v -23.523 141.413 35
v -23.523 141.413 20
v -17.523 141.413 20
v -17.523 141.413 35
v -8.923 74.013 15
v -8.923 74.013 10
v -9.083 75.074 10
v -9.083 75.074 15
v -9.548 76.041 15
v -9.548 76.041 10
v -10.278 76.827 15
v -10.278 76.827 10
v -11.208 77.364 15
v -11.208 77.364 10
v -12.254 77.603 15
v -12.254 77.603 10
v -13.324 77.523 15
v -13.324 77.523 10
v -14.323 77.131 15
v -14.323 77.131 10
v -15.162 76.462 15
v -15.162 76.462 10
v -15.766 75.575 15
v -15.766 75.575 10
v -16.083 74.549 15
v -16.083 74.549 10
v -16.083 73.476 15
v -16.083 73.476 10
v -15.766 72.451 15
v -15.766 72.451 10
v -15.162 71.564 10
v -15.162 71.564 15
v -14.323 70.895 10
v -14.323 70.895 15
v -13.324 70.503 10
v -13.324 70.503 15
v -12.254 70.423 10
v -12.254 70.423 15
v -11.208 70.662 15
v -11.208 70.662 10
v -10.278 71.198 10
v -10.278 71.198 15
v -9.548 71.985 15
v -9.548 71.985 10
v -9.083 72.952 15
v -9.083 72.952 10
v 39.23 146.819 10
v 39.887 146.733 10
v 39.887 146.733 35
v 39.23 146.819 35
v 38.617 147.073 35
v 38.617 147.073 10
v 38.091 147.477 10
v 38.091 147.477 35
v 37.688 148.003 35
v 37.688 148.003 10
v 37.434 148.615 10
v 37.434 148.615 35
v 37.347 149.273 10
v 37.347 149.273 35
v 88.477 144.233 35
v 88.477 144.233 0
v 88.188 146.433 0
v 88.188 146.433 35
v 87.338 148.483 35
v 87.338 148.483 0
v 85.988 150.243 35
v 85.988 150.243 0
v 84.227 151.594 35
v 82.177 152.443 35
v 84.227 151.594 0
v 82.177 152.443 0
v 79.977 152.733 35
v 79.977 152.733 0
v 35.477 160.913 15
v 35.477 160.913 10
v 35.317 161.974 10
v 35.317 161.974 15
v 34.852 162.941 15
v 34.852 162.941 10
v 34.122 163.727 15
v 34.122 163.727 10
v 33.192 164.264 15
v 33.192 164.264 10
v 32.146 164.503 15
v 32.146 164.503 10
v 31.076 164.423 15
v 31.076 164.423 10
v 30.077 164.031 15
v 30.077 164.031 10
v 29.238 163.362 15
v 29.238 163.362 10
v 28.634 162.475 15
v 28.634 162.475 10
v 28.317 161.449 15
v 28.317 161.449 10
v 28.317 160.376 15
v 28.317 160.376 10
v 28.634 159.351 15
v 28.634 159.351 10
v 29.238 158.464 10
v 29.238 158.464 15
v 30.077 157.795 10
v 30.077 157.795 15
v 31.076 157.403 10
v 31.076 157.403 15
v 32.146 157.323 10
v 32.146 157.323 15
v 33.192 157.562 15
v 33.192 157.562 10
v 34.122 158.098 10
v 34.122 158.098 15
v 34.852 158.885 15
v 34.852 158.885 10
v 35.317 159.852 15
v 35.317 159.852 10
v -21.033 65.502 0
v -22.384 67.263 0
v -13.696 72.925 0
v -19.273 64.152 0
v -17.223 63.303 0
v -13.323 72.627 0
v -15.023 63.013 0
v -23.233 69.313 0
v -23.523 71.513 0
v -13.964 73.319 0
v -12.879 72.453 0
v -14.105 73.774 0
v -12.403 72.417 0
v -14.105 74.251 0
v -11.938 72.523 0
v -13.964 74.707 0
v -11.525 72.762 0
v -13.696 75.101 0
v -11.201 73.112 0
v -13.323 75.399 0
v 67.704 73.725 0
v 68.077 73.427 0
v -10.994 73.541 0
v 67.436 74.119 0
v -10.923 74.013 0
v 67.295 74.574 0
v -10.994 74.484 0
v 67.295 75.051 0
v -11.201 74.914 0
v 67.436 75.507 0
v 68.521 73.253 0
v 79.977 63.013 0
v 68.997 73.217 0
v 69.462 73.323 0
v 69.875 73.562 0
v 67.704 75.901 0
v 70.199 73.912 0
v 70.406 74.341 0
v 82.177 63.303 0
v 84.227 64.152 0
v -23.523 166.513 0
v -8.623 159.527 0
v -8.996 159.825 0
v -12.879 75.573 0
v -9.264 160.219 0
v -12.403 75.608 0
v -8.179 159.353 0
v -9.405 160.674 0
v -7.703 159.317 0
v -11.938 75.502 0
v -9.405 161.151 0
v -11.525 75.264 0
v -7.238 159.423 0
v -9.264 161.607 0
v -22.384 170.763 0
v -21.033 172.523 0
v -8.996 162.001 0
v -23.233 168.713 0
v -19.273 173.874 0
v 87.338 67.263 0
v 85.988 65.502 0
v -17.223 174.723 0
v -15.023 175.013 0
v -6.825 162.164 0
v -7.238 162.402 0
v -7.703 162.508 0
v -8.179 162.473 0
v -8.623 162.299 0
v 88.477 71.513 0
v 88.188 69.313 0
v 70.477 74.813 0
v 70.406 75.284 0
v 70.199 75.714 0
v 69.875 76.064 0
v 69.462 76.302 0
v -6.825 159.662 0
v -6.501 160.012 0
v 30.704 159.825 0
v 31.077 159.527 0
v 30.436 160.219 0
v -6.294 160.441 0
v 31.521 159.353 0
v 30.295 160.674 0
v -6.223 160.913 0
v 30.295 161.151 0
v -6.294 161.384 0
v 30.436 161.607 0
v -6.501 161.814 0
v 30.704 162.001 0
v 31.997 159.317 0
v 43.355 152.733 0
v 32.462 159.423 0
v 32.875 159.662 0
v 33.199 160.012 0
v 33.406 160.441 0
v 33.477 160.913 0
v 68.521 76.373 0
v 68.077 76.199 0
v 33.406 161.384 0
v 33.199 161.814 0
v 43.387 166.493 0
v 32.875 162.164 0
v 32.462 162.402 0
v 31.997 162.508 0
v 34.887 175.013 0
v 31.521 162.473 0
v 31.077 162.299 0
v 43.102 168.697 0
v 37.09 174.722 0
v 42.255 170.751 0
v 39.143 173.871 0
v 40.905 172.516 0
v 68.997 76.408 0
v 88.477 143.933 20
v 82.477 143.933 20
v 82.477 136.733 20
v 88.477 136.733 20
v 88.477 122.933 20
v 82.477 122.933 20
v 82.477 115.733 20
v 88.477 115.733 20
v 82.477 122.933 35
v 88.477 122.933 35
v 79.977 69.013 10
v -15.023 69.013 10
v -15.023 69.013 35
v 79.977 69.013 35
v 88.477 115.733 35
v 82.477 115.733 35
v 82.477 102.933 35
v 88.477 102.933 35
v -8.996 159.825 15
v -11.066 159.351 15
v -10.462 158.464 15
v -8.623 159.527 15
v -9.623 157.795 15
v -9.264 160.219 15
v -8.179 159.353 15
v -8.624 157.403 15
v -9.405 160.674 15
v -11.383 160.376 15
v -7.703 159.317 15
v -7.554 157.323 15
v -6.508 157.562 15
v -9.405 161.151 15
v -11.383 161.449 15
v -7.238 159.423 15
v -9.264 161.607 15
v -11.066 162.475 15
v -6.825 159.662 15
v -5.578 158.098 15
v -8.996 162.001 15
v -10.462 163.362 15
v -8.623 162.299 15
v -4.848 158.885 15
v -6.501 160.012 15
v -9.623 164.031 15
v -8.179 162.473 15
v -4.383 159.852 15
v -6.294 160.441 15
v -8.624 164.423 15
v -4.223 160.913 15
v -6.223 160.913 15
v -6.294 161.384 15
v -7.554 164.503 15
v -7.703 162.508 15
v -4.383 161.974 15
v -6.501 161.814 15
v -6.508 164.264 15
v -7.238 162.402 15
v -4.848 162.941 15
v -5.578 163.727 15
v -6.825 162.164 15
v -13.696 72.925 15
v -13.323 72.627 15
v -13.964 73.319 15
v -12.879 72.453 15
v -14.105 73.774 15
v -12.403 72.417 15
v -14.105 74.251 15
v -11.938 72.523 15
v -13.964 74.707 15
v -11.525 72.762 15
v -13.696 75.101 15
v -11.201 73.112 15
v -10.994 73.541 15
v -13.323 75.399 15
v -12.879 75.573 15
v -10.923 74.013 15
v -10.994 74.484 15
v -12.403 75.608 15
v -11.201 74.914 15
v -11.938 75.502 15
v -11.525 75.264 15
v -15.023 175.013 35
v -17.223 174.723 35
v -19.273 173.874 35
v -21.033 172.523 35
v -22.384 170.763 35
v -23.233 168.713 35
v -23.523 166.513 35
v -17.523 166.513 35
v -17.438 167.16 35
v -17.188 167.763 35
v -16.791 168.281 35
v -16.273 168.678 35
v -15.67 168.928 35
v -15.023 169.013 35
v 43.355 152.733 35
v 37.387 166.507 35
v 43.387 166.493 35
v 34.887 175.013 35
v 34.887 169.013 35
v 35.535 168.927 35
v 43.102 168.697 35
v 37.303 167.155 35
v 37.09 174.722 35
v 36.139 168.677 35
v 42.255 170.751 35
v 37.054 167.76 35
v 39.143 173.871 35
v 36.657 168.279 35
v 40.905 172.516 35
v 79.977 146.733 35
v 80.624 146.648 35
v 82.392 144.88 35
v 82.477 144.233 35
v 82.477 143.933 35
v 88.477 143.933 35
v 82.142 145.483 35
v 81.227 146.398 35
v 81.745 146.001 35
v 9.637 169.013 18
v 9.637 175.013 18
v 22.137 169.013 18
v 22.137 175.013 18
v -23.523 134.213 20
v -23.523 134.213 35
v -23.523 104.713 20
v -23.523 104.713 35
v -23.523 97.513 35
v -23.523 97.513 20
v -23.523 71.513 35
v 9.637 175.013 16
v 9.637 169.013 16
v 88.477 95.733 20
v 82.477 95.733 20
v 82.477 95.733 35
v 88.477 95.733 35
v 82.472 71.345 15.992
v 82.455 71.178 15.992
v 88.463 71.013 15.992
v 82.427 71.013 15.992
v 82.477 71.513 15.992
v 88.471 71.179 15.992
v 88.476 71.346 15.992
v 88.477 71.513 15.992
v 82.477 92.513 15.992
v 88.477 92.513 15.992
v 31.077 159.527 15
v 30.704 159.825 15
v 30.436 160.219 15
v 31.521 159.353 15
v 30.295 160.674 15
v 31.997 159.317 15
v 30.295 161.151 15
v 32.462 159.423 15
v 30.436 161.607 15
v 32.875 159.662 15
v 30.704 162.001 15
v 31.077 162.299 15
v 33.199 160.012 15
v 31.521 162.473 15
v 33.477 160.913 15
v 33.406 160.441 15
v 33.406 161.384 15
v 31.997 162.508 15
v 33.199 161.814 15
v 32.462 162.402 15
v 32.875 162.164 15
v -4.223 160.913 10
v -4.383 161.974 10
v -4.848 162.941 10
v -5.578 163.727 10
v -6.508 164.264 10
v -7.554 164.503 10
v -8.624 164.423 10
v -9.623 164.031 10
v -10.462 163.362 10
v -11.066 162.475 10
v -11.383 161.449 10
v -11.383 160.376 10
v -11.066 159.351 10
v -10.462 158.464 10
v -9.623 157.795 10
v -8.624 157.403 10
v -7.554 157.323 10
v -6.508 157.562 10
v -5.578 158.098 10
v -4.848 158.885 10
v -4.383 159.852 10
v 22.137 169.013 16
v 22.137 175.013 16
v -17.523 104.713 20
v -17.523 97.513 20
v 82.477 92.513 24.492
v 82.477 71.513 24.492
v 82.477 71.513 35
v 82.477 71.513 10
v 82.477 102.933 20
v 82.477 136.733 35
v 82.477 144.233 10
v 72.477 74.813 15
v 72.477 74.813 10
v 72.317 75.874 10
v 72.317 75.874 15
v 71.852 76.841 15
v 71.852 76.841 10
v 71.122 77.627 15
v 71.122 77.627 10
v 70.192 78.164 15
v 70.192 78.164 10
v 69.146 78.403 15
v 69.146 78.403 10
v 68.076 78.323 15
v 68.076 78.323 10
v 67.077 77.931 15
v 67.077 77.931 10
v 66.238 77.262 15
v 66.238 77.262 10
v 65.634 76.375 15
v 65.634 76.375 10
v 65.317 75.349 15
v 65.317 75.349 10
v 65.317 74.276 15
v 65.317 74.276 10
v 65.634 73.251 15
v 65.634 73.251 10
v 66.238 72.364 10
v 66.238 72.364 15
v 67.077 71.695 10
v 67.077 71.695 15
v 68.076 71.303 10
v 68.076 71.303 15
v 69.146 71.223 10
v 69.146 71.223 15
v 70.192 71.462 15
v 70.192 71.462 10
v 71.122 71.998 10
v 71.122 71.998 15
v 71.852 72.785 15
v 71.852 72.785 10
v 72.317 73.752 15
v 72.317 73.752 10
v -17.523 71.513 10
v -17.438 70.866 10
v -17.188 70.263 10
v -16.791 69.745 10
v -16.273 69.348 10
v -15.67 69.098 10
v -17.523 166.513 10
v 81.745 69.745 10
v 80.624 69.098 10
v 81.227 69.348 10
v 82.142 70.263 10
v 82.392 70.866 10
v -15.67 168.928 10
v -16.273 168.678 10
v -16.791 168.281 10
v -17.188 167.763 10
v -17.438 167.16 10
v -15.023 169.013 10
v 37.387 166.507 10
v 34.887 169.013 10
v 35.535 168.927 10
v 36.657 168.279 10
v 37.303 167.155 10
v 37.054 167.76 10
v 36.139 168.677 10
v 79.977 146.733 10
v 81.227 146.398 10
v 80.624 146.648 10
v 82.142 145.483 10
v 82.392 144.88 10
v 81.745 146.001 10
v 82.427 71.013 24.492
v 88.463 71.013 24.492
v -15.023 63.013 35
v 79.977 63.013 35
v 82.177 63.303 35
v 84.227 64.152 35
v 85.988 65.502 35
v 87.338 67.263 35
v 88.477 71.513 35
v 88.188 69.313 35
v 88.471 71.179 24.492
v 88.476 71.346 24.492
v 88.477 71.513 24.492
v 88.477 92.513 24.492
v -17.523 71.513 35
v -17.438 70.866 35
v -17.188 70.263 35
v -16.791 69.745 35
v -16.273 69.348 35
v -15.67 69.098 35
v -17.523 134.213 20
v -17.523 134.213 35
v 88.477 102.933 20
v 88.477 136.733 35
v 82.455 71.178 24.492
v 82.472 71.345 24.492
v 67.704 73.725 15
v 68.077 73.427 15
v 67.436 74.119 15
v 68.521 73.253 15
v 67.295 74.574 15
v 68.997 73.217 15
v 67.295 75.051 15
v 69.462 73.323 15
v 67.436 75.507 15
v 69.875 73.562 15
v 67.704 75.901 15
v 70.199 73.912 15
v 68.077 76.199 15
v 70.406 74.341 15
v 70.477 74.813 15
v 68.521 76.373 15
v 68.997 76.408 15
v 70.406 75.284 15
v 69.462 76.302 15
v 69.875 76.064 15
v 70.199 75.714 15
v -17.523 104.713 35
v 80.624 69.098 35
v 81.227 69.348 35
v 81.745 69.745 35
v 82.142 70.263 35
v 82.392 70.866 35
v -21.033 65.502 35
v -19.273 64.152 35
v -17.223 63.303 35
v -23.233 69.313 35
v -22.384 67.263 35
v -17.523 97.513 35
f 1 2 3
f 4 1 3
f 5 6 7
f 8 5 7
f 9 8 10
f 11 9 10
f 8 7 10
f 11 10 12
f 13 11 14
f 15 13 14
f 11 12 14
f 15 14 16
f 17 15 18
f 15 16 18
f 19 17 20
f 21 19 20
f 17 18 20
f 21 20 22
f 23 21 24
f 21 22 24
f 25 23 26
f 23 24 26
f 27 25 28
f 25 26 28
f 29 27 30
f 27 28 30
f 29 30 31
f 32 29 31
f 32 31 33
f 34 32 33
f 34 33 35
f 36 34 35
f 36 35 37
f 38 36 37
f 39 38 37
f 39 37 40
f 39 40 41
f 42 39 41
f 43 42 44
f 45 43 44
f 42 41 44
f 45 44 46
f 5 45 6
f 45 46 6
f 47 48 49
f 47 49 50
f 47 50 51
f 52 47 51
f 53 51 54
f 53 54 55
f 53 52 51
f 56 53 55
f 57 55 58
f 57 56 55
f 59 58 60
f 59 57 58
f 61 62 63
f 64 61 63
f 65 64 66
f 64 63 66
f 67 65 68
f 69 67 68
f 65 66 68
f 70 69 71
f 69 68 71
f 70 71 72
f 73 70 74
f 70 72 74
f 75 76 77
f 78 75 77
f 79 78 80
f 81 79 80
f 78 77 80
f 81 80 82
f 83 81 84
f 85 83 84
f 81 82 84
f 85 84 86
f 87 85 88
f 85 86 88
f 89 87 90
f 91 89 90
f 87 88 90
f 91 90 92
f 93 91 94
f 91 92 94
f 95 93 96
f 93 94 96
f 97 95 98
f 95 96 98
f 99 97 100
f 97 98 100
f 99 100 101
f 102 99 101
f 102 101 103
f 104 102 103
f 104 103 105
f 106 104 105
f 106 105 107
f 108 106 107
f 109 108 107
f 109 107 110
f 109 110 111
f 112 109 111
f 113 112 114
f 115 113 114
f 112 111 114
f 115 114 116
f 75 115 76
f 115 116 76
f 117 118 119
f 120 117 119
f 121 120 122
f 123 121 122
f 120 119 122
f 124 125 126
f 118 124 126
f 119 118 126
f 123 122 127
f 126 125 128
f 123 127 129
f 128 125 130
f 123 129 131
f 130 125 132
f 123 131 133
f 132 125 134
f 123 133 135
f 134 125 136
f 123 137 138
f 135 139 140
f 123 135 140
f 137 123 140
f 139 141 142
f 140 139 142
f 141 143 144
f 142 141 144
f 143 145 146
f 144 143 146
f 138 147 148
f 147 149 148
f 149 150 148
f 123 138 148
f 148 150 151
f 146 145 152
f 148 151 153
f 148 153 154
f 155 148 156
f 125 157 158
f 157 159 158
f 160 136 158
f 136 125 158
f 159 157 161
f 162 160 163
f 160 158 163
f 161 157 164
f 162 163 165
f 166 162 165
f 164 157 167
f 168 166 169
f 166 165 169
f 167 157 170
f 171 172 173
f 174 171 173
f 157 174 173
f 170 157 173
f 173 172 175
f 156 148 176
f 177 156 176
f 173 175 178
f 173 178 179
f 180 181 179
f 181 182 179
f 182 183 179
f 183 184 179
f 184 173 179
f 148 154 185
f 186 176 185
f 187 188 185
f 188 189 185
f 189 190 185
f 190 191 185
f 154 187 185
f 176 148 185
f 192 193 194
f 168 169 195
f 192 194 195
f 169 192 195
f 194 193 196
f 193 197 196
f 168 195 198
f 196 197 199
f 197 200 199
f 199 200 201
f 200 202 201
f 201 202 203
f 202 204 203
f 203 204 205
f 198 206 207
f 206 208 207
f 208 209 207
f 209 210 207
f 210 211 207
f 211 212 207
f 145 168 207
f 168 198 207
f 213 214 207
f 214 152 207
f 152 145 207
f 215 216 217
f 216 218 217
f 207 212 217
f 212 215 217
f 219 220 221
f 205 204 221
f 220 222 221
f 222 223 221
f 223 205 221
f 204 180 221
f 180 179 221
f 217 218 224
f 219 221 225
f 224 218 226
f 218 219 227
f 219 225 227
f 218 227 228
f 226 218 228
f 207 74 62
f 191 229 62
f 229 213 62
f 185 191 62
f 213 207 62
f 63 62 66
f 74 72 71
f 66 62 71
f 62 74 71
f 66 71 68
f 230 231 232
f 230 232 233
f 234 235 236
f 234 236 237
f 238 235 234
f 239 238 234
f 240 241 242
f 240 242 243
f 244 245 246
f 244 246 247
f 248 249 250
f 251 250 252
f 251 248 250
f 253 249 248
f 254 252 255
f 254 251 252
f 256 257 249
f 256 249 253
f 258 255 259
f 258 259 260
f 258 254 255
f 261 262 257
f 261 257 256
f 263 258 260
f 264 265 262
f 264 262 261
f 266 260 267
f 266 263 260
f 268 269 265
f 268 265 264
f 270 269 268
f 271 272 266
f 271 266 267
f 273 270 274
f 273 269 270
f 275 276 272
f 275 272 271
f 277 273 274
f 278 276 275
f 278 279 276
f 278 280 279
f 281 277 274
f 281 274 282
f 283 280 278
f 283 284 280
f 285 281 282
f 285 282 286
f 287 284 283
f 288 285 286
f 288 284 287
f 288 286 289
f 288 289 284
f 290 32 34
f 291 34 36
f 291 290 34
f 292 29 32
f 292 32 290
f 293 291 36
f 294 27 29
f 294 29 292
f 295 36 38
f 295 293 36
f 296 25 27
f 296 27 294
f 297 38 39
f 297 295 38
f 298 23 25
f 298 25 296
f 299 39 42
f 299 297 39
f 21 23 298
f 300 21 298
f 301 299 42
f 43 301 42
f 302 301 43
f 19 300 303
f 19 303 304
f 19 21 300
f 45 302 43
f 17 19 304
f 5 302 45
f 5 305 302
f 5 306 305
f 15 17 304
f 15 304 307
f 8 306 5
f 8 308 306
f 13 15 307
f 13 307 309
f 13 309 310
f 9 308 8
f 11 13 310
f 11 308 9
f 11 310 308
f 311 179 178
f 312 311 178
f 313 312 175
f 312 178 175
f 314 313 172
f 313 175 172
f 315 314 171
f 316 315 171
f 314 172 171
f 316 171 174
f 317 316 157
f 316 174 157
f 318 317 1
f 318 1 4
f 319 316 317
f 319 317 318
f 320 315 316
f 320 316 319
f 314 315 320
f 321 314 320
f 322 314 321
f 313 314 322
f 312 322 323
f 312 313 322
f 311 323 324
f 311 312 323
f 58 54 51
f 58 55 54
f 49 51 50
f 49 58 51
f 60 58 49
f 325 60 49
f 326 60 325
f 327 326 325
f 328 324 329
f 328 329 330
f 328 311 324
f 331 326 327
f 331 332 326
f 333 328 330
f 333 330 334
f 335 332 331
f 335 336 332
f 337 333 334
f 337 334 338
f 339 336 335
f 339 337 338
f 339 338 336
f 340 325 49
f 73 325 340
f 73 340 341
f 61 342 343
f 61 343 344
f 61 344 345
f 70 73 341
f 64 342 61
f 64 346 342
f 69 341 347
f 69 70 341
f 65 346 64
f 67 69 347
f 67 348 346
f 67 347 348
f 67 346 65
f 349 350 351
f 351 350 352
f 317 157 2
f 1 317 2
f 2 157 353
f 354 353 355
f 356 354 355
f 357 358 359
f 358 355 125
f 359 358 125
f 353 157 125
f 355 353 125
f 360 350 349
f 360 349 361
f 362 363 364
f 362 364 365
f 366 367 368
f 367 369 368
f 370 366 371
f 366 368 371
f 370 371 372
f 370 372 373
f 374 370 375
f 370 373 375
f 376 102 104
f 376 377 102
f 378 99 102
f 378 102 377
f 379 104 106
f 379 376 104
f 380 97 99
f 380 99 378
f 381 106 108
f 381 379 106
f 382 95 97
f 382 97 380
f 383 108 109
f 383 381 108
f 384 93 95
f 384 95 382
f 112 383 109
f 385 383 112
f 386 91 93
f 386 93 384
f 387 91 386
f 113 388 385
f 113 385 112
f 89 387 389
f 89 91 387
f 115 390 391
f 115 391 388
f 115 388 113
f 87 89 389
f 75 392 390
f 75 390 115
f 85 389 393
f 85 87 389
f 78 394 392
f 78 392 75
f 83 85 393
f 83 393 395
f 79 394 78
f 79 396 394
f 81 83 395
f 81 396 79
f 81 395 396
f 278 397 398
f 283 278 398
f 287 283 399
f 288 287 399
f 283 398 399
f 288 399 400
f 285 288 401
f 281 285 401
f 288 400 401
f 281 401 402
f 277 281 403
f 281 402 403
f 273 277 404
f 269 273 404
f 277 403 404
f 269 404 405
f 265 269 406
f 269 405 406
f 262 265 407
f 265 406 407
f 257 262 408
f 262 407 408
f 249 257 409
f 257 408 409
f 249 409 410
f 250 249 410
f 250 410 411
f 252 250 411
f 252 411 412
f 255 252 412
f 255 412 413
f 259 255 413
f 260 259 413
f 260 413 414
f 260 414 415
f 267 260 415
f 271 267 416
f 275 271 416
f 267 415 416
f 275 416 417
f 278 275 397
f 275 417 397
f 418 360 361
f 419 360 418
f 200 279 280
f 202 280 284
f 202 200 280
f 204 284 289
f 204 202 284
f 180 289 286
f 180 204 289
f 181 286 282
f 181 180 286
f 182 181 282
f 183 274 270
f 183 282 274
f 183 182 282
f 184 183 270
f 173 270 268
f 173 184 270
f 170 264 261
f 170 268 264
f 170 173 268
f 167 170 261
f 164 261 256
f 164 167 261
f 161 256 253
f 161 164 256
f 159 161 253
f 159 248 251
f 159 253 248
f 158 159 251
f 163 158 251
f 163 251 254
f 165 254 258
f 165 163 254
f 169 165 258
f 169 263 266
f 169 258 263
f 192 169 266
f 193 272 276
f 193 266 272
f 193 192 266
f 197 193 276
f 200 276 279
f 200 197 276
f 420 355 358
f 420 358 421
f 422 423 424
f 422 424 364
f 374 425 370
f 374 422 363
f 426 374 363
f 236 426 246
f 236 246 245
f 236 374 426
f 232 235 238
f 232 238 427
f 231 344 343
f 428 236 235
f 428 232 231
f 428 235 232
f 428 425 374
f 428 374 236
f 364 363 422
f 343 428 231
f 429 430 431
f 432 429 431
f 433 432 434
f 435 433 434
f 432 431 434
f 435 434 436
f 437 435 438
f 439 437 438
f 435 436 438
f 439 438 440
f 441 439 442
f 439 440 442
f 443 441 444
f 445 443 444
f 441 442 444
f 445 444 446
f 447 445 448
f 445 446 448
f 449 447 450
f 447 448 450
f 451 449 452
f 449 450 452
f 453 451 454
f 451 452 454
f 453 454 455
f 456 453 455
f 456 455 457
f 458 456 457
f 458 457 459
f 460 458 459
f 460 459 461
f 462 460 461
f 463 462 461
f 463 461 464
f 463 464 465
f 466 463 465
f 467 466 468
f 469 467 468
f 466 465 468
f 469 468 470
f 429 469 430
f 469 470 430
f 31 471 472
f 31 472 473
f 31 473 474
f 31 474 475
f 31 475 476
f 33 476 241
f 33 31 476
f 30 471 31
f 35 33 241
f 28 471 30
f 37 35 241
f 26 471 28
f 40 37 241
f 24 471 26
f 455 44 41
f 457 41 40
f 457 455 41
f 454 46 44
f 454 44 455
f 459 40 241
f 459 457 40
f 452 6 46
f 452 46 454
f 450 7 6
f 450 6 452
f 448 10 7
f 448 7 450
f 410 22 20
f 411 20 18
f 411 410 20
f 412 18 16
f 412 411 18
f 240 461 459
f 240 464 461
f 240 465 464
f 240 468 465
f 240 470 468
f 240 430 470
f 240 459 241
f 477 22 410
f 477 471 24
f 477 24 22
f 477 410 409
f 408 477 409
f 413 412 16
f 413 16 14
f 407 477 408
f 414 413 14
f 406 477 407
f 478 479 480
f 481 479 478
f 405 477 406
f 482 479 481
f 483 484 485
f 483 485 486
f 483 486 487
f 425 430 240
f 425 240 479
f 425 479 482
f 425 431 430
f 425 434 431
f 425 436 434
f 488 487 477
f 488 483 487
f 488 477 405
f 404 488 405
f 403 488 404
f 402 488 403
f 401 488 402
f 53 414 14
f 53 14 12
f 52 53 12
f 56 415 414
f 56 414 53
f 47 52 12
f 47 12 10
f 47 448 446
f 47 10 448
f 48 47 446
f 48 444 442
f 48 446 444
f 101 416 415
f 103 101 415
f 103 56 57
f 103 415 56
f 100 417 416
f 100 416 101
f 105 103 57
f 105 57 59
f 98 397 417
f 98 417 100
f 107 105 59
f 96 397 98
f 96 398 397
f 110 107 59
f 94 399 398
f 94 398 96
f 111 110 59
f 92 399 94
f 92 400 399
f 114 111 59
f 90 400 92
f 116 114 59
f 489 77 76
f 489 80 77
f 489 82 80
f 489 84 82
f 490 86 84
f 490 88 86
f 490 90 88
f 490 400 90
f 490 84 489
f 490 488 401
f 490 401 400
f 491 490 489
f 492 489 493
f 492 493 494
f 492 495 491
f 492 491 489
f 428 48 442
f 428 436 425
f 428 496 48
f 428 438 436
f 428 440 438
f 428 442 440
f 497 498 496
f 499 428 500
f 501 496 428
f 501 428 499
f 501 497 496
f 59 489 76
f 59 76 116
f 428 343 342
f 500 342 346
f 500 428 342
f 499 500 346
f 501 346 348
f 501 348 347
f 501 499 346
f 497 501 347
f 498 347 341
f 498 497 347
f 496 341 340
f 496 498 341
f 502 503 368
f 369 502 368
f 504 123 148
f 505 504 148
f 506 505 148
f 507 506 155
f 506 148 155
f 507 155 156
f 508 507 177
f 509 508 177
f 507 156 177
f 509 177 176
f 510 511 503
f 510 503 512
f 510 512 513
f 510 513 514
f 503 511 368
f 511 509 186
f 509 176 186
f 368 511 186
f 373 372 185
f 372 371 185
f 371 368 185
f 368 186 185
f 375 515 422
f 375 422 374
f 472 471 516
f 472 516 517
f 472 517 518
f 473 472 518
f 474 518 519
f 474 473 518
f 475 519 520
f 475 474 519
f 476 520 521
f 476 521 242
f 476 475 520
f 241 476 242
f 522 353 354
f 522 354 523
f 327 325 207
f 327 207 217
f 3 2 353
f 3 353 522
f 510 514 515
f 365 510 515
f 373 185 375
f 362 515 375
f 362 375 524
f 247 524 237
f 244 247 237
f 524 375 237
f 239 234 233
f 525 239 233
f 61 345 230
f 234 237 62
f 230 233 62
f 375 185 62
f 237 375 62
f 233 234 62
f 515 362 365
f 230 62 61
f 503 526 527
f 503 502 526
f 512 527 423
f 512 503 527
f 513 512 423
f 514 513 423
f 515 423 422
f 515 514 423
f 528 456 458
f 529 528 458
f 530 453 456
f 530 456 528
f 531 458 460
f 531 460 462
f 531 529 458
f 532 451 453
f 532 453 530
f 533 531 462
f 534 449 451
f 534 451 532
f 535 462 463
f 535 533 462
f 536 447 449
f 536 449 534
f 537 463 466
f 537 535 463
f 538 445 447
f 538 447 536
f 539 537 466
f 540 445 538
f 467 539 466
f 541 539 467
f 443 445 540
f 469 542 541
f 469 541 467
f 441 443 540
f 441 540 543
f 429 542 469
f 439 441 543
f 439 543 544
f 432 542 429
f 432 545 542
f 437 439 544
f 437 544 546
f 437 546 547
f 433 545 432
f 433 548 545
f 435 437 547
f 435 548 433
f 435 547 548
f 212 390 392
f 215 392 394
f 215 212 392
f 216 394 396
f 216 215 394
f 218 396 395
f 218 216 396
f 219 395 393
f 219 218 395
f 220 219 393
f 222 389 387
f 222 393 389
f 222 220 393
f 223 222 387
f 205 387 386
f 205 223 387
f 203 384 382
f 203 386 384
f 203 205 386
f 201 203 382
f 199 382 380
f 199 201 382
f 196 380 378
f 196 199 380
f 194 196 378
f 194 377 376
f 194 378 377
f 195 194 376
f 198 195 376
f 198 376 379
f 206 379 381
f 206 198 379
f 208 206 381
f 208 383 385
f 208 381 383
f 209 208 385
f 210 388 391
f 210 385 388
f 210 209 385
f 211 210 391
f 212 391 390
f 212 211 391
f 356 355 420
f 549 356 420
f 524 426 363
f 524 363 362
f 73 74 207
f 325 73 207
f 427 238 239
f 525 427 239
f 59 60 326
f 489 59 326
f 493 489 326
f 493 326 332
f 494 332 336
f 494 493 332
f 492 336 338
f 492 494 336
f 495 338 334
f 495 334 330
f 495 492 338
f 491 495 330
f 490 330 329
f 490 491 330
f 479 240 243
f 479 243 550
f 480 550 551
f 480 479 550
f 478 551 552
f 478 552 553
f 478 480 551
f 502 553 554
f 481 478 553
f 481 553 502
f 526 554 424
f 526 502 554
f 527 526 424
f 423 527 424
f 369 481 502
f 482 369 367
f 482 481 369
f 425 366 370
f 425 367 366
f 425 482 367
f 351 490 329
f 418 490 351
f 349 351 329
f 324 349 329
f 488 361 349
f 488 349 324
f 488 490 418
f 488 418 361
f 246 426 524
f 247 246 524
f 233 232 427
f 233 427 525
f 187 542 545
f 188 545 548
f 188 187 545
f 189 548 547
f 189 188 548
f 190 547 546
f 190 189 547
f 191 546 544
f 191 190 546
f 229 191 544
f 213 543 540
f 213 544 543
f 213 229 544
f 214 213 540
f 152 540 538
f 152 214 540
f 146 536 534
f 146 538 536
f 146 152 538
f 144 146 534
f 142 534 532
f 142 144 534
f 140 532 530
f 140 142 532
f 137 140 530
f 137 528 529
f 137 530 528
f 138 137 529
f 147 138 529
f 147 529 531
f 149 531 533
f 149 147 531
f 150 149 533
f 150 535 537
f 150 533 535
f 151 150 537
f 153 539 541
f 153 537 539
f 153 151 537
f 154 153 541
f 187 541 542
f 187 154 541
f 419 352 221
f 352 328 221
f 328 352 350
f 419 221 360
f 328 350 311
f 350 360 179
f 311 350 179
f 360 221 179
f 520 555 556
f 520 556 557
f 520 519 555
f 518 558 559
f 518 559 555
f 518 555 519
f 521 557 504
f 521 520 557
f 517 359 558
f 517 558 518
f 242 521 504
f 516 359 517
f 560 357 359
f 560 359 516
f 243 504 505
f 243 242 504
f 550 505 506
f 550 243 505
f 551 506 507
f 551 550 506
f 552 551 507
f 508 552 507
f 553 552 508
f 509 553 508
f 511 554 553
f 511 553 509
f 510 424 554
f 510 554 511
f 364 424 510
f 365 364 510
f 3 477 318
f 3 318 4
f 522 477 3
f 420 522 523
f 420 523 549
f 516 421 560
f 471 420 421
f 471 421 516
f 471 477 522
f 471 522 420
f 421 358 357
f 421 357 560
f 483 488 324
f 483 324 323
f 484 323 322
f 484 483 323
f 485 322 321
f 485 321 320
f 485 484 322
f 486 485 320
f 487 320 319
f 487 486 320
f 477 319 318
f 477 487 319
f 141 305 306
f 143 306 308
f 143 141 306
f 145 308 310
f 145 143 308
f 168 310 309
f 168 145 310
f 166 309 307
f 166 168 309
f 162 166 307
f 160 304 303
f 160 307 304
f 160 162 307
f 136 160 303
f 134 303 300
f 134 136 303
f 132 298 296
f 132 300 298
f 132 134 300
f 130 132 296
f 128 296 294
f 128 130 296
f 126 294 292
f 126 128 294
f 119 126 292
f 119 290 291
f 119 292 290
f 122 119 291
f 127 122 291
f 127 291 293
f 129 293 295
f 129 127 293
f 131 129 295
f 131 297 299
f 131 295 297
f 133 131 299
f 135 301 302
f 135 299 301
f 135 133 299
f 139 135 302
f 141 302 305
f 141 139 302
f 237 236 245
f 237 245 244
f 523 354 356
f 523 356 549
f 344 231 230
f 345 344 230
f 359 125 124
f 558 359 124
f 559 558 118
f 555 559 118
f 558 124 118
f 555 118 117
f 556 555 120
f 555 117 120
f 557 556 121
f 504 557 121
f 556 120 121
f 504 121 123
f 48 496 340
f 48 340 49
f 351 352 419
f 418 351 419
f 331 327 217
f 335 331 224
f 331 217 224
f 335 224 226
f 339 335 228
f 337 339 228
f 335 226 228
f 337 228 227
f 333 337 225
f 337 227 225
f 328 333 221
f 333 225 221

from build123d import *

# Parameters (mm, degrees)
BOSS_EXTRUDE1_DEPTH     = 35
SKETCH4_3_R             = 1.6
BOSS_EXTRUDE2_DEPTH     = 10
SKETCH6_R               = 3.6
BOSS_EXTRUDE4_DEPTH     = 5
CUT_EXTRUDE3_DEPTH      = 198.693522892
CUT_EXTRUDE3_DEPTH_BACK = 198.693522892
SKETCH10_R              = 1.6
CUT_EXTRUDE4_REACH      = 212.71
SKETCH11_W              = 8.5
SKETCH11_H              = 21.5
SKETCH12_W              = 12.5
SKETCH12_H              = 2
CUT_EXTRUDE5_DEPTH      = 6
SKETCH13_W              = 6
SKETCH13_H              = 7.2
CUT_EXTRUDE6_DEPTH      = 15
SKETCH14_W              = 6
SKETCH14_H              = 7.2
CUT_EXTRUDE7_DEPTH      = 15


with BuildPart() as part:
    # Sketch4 → Boss-Extrude1 (new body)
    with BuildSketch(Plane.XY):
        with BuildLine():
            Line((43.355273195, 152.732885516), (43.387199595, 166.493163991))
            ThreePointArc((43.387199595, 166.493163991), (40.904598686, 172.516316495), (34.887222474, 175.012885516))
            Line((34.887222474, 175.012885516), (-15.022777526, 175.012885516))
            ThreePointArc((-15.022777526, 175.012885516), (-21.033185166, 172.523293156), (-23.522777526, 166.512885516))
            Line((-23.522777526, 166.512885516), (-23.522777526, 71.512885516))
            ThreePointArc((-23.522777526, 71.512885516), (-21.033185166, 65.502477876), (-15.022777526, 63.012885516))
            Line((-15.022777526, 63.012885516), (79.977222474, 63.012885516))
            ThreePointArc((79.977222474, 63.012885516), (85.987630114, 65.502477876), (88.477222474, 71.512885516))
            Line((88.477222474, 71.512885516), (88.477222474, 144.232885516))
            ThreePointArc((88.477222474, 144.232885516), (85.987630114, 150.243293156), (79.977222474, 152.732885516))
            Line((79.977222474, 152.732885516), (77.987222474, 152.732885516))
            Line((77.987222474, 152.732885516), (71.637222474, 152.732885516))
            Line((71.637222474, 152.732885516), (50.047222474, 152.732885516))
            Line((50.047222474, 152.732885516), (43.697222474, 152.732885516))
            Line((43.697222474, 152.732885516), (43.355273195, 152.732885516))
        make_face()
        with BuildLine():
            ThreePointArc((37.387215745, 166.507085068), (36.657039007, 168.27860051), (34.887222474, 169.012885516))
            Line((34.887222474, 169.012885516), (-15.022777526, 169.012885516))
            ThreePointArc((-15.022777526, 169.012885516), (-16.790544479, 168.280652469), (-17.522777526, 166.512885516))
            Line((-17.522777526, 166.512885516), (-17.522777526, 71.512885516))
            ThreePointArc((-17.522777526, 71.512885516), (-16.790544479, 69.745118563), (-15.022777526, 69.012885516))
            Line((-15.022777526, 69.012885516), (79.977222474, 69.012885516))
            ThreePointArc((79.977222474, 69.012885516), (81.744989427, 69.745118563), (82.477222474, 71.512885516))
            Line((82.477222474, 71.512885516), (82.477222474, 144.232885516))
            ThreePointArc((82.477222474, 144.232885516), (81.744989427, 146.000652469), (79.977222474, 146.732885516))
            Line((79.977222474, 146.732885516), (77.987222474, 146.732885516))
            Line((77.987222474, 146.732885516), (71.637222474, 146.732885516))
            Line((71.637222474, 146.732885516), (50.047222474, 146.732885516))
            Line((50.047222474, 146.732885516), (43.697222474, 146.732885516))
            Line((43.697222474, 146.732885516), (39.887222474, 146.732885516))
            ThreePointArc((39.887222474, 146.732885516), (38.091175602, 147.476836668), (37.347229203, 149.272885508))
            Line((37.347229203, 149.272885508), (37.387215745, 166.507085068))
        make_face(mode=Mode.SUBTRACT)
    extrude(amount=BOSS_EXTRUDE1_DEPTH)

    # Sketch4<3> → Boss-Extrude2 (add)
    with BuildSketch(Plane.XY):
        with BuildLine():
            Line((37.347229203, 149.272885508), (37.387215745, 166.507085068))
            ThreePointArc((37.387215745, 166.507085068), (36.657039007, 168.27860051), (34.887222474, 169.012885516))
            Line((34.887222474, 169.012885516), (-15.022777526, 169.012885516))
            ThreePointArc((-15.022777526, 169.012885516), (-16.790544479, 168.280652469), (-17.522777526, 166.512885516))
            Line((-17.522777526, 166.512885516), (-17.522777526, 71.512885516))
            ThreePointArc((-17.522777526, 71.512885516), (-16.790544479, 69.745118563), (-15.022777526, 69.012885516))
            Line((-15.022777526, 69.012885516), (79.977222474, 69.012885516))
            ThreePointArc((79.977222474, 69.012885516), (81.744989427, 69.745118563), (82.477222474, 71.512885516))
            Line((82.477222474, 71.512885516), (82.477222474, 144.232885516))
            ThreePointArc((82.477222474, 144.232885516), (81.744989427, 146.000652469), (79.977222474, 146.732885516))
            Line((79.977222474, 146.732885516), (77.987222474, 146.732885516))
            Line((77.987222474, 146.732885516), (71.637222474, 146.732885516))
            Line((71.637222474, 146.732885516), (50.047222474, 146.732885516))
            Line((50.047222474, 146.732885516), (43.697222474, 146.732885516))
            Line((43.697222474, 146.732885516), (39.887222474, 146.732885516))
            ThreePointArc((39.887222474, 146.732885516), (38.091175602, 147.476836668), (37.347229203, 149.272885508))
        make_face()
        with Locations((-7.822777526, 160.912885516)):
            Circle(SKETCH4_3_R, mode=Mode.SUBTRACT)
        with Locations((31.877222474, 160.912885516)):
            Circle(SKETCH4_3_R, mode=Mode.SUBTRACT)
        with Locations((68.877222474, 74.812885516)):
            Circle(SKETCH4_3_R, mode=Mode.SUBTRACT)
        with Locations((-12.522777526, 74.012885516)):
            Circle(SKETCH4_3_R, mode=Mode.SUBTRACT)
    extrude(amount=BOSS_EXTRUDE2_DEPTH)

    # Sketch6 → Boss-Extrude4 (add)
    with BuildSketch(Plane.XY.offset(10)):
        with Locations((68.877222474, 74.812885516)):
            Circle(SKETCH6_R)
        with Locations((-12.522777526, 74.012885516)):
            Circle(SKETCH6_R)
        with Locations((31.877222474, 160.912885516)):
            Circle(SKETCH6_R)
        with Locations((-7.822777526, 160.912885516)):
            Circle(SKETCH6_R)
    extrude(amount=BOSS_EXTRUDE4_DEPTH)

    # Sketch10 → Cut-Extrude3 (cut, two sides: drawn at the far end of the back side and taken through both)
    with BuildSketch(Plane.XY.offset(10).offset(-CUT_EXTRUDE3_DEPTH_BACK)):
        with Locations((-7.822777526, 160.912885516)):
            Circle(SKETCH10_R)
        with Locations((-12.522777526, 74.012885516)):
            Circle(SKETCH10_R)
        with Locations((31.877222474, 160.912885516)):
            Circle(SKETCH10_R)
        with Locations((68.877222474, 74.812885516)):
            Circle(SKETCH10_R)
    extrude(amount=CUT_EXTRUDE3_DEPTH + CUT_EXTRUDE3_DEPTH_BACK, mode=Mode.SUBTRACT)

    # Sketch11 → Cut-Extrude4 (cut, up to next)
    with BuildSketch(Plane(origin=(88.477222474, 0, 0), x_dir=(0, 0, -1), z_dir=(1, 0, 0)), mode=Mode.PRIVATE) as cut_extrude4_sk1:
        with Locations((-20.242185592, 81.762885516)):
            Rectangle(SKETCH11_W, SKETCH11_H)
    cut_extrude4_tool1 = extrude(cut_extrude4_sk1.sketch, amount=-CUT_EXTRUDE4_REACH, mode=Mode.PRIVATE) & part.part
    add(cut_extrude4_tool1.solids().sort_by_distance((88.477222, 81.762886, 20.242186))[0], mode=Mode.SUBTRACT)

    # Sketch12 → Cut-Extrude5 (cut)
    with BuildSketch(Plane(origin=(0, 175.012885516, 0), x_dir=(1, 0, 0), z_dir=(0, 1, 0))):
        with Locations((15.887215745, -17)):
            Rectangle(SKETCH12_W, SKETCH12_H)
    extrude(amount=-CUT_EXTRUDE5_DEPTH, mode=Mode.SUBTRACT)

    # Sketch13 → Cut-Extrude6 (cut)
    with BuildSketch(Plane.XY.offset(35)):
        with Locations((85.477222474, 140.332885516)):
            Rectangle(SKETCH13_W, SKETCH13_H)
        with Locations((85.477222474, 119.332885516)):
            Rectangle(SKETCH13_W, SKETCH13_H)
        with Locations((85.477222474, 99.332885516)):
            Rectangle(SKETCH13_W, SKETCH13_H)
    extrude(amount=-CUT_EXTRUDE6_DEPTH, mode=Mode.SUBTRACT)

    # Sketch14 → Cut-Extrude7 (cut)
    with BuildSketch(Plane.XY.offset(35)):
        with Locations((-20.522777526, 101.112885516)):
            Rectangle(SKETCH14_W, SKETCH14_H)
        with Locations((-20.522777526, 137.812885516)):
            Rectangle(SKETCH14_W, SKETCH14_H)
    extrude(amount=-CUT_EXTRUDE7_DEPTH, mode=Mode.SUBTRACT)


solid = part.part
